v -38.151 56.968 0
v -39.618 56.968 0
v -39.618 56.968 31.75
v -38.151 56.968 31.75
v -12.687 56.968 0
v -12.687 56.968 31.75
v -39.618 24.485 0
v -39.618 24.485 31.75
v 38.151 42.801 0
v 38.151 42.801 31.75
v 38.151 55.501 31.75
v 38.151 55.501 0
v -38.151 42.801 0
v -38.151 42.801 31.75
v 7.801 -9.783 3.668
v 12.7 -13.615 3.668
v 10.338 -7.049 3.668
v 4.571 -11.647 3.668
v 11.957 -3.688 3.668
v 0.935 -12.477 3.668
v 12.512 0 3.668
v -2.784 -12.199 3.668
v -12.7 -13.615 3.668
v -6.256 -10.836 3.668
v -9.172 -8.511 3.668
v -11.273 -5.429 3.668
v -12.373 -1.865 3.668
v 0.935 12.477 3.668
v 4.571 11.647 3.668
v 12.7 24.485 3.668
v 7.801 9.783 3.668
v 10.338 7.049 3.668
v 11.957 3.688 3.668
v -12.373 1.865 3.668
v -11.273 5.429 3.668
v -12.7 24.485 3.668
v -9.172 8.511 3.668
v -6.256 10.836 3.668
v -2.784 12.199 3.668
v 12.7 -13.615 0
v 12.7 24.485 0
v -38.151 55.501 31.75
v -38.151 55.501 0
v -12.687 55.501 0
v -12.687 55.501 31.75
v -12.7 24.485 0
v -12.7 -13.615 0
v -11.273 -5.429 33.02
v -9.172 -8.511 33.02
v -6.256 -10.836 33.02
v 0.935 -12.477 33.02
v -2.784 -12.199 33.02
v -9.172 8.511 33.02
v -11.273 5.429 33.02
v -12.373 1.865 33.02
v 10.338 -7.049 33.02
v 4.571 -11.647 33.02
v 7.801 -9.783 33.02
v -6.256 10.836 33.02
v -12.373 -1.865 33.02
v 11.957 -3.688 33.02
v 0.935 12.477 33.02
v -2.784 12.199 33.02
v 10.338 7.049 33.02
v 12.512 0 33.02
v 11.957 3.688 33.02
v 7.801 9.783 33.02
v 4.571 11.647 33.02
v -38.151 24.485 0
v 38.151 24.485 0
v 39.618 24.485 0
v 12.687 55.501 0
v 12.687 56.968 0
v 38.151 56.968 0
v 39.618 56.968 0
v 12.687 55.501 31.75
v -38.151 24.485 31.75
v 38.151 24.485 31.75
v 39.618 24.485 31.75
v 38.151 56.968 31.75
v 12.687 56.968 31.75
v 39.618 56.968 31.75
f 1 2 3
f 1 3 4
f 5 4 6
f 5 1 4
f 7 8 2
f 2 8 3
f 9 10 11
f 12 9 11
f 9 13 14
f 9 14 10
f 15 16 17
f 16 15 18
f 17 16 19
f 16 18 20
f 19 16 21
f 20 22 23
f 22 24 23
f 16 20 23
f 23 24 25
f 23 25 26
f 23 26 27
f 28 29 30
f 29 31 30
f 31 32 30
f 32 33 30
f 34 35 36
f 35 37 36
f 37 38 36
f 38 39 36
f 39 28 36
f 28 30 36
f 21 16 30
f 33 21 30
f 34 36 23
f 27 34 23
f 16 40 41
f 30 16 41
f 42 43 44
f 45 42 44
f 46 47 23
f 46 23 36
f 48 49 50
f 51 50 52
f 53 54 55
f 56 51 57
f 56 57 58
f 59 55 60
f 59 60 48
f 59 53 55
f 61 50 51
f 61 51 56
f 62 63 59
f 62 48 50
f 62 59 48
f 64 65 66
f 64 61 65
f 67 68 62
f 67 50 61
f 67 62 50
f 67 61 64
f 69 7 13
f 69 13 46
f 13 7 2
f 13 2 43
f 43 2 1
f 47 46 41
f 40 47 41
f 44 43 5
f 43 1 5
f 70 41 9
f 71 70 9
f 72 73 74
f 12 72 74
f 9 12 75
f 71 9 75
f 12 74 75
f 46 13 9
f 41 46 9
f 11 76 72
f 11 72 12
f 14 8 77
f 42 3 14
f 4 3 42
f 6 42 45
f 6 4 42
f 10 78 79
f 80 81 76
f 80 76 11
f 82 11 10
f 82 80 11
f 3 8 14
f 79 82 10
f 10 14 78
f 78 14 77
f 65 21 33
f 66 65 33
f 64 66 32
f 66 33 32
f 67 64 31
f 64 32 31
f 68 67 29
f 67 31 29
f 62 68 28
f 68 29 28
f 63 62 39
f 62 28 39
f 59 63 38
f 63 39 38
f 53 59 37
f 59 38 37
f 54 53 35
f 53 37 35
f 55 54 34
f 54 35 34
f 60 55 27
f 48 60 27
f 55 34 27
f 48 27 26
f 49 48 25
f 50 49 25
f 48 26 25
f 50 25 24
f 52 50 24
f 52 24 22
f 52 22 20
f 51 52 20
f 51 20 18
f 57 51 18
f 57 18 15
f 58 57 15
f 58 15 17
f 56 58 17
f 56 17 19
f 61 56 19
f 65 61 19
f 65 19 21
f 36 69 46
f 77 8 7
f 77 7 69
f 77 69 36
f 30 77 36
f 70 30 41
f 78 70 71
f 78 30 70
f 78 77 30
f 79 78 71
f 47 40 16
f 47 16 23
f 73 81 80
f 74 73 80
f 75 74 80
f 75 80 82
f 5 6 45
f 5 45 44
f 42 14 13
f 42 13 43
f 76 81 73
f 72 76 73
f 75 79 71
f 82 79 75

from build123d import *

# Parameters (mm, degrees)
SKETCH1_R           = 12.512434662
BOSS_EXTRUDE1_DEPTH = 33.02
SKETCH9_W           = 25.4
SKETCH9_H           = 38.1
BOSS_EXTRUDE2_DEPTH = 3.66776
SKETCH10_W          = 76.3016
SKETCH10_H          = 31.75
BOSS_EXTRUDE3_DEPTH = 18.316200479
SKETCH13_W          = 1.467555556
SKETCH13_H          = 32.483304479
BOSS_EXTRUDE4_DEPTH = 31.75
SKETCH14_W          = 25.4635
SKETCH14_H          = 31.75
BOSS_EXTRUDE5_DEPTH = 1.467104


with BuildPart() as part:
    # Sketch1 → Boss-Extrude1 (new body)
    with BuildSketch(Plane.XY):
        Circle(SKETCH1_R)
    extrude(amount=BOSS_EXTRUDE1_DEPTH)

    # Sketch9 → Boss-Extrude2 (add)
    with BuildSketch(Plane(origin=(0, 0, 0), x_dir=(-1, 0, 0), z_dir=(0, 0, -1))):
        with Locations((0, 5.434708389)):
            Rectangle(SKETCH9_W, SKETCH9_H)
    extrude(amount=-BOSS_EXTRUDE2_DEPTH)

    # Sketch10 → Boss-Extrude3 (add)
    with BuildSketch(Plane(origin=(0, 24.484708389, 0), x_dir=(1, 0, 0), z_dir=(0, 1, 0))):
        with Locations((0, -15.875)):
            Rectangle(SKETCH10_W, SKETCH10_H)
    extrude(amount=BOSS_EXTRUDE3_DEPTH)

    # Sketch13 → Boss-Extrude4 (add)
    with BuildSketch(Plane.XY.offset(31.75)):
        with Locations((-38.884577778, 40.726360629)):
            Rectangle(SKETCH13_W, SKETCH13_H)
        with Locations((38.884577778, 40.726360629)):
            Rectangle(SKETCH13_W, SKETCH13_H)
    extrude(amount=-BOSS_EXTRUDE4_DEPTH)

    # Sketch14 → Boss-Extrude5 (add)
    with BuildSketch(Plane(origin=(0, 56.968012868, 0), x_dir=(1, 0, 0), z_dir=(0, 1, 0))):
        with Locations((-25.41905, -15.875)):
            Rectangle(SKETCH14_W, SKETCH14_H)
        with Locations((25.41905, -15.875)):
            Rectangle(SKETCH14_W, SKETCH14_H)
    extrude(amount=-BOSS_EXTRUDE5_DEPTH)


solid = part.part
